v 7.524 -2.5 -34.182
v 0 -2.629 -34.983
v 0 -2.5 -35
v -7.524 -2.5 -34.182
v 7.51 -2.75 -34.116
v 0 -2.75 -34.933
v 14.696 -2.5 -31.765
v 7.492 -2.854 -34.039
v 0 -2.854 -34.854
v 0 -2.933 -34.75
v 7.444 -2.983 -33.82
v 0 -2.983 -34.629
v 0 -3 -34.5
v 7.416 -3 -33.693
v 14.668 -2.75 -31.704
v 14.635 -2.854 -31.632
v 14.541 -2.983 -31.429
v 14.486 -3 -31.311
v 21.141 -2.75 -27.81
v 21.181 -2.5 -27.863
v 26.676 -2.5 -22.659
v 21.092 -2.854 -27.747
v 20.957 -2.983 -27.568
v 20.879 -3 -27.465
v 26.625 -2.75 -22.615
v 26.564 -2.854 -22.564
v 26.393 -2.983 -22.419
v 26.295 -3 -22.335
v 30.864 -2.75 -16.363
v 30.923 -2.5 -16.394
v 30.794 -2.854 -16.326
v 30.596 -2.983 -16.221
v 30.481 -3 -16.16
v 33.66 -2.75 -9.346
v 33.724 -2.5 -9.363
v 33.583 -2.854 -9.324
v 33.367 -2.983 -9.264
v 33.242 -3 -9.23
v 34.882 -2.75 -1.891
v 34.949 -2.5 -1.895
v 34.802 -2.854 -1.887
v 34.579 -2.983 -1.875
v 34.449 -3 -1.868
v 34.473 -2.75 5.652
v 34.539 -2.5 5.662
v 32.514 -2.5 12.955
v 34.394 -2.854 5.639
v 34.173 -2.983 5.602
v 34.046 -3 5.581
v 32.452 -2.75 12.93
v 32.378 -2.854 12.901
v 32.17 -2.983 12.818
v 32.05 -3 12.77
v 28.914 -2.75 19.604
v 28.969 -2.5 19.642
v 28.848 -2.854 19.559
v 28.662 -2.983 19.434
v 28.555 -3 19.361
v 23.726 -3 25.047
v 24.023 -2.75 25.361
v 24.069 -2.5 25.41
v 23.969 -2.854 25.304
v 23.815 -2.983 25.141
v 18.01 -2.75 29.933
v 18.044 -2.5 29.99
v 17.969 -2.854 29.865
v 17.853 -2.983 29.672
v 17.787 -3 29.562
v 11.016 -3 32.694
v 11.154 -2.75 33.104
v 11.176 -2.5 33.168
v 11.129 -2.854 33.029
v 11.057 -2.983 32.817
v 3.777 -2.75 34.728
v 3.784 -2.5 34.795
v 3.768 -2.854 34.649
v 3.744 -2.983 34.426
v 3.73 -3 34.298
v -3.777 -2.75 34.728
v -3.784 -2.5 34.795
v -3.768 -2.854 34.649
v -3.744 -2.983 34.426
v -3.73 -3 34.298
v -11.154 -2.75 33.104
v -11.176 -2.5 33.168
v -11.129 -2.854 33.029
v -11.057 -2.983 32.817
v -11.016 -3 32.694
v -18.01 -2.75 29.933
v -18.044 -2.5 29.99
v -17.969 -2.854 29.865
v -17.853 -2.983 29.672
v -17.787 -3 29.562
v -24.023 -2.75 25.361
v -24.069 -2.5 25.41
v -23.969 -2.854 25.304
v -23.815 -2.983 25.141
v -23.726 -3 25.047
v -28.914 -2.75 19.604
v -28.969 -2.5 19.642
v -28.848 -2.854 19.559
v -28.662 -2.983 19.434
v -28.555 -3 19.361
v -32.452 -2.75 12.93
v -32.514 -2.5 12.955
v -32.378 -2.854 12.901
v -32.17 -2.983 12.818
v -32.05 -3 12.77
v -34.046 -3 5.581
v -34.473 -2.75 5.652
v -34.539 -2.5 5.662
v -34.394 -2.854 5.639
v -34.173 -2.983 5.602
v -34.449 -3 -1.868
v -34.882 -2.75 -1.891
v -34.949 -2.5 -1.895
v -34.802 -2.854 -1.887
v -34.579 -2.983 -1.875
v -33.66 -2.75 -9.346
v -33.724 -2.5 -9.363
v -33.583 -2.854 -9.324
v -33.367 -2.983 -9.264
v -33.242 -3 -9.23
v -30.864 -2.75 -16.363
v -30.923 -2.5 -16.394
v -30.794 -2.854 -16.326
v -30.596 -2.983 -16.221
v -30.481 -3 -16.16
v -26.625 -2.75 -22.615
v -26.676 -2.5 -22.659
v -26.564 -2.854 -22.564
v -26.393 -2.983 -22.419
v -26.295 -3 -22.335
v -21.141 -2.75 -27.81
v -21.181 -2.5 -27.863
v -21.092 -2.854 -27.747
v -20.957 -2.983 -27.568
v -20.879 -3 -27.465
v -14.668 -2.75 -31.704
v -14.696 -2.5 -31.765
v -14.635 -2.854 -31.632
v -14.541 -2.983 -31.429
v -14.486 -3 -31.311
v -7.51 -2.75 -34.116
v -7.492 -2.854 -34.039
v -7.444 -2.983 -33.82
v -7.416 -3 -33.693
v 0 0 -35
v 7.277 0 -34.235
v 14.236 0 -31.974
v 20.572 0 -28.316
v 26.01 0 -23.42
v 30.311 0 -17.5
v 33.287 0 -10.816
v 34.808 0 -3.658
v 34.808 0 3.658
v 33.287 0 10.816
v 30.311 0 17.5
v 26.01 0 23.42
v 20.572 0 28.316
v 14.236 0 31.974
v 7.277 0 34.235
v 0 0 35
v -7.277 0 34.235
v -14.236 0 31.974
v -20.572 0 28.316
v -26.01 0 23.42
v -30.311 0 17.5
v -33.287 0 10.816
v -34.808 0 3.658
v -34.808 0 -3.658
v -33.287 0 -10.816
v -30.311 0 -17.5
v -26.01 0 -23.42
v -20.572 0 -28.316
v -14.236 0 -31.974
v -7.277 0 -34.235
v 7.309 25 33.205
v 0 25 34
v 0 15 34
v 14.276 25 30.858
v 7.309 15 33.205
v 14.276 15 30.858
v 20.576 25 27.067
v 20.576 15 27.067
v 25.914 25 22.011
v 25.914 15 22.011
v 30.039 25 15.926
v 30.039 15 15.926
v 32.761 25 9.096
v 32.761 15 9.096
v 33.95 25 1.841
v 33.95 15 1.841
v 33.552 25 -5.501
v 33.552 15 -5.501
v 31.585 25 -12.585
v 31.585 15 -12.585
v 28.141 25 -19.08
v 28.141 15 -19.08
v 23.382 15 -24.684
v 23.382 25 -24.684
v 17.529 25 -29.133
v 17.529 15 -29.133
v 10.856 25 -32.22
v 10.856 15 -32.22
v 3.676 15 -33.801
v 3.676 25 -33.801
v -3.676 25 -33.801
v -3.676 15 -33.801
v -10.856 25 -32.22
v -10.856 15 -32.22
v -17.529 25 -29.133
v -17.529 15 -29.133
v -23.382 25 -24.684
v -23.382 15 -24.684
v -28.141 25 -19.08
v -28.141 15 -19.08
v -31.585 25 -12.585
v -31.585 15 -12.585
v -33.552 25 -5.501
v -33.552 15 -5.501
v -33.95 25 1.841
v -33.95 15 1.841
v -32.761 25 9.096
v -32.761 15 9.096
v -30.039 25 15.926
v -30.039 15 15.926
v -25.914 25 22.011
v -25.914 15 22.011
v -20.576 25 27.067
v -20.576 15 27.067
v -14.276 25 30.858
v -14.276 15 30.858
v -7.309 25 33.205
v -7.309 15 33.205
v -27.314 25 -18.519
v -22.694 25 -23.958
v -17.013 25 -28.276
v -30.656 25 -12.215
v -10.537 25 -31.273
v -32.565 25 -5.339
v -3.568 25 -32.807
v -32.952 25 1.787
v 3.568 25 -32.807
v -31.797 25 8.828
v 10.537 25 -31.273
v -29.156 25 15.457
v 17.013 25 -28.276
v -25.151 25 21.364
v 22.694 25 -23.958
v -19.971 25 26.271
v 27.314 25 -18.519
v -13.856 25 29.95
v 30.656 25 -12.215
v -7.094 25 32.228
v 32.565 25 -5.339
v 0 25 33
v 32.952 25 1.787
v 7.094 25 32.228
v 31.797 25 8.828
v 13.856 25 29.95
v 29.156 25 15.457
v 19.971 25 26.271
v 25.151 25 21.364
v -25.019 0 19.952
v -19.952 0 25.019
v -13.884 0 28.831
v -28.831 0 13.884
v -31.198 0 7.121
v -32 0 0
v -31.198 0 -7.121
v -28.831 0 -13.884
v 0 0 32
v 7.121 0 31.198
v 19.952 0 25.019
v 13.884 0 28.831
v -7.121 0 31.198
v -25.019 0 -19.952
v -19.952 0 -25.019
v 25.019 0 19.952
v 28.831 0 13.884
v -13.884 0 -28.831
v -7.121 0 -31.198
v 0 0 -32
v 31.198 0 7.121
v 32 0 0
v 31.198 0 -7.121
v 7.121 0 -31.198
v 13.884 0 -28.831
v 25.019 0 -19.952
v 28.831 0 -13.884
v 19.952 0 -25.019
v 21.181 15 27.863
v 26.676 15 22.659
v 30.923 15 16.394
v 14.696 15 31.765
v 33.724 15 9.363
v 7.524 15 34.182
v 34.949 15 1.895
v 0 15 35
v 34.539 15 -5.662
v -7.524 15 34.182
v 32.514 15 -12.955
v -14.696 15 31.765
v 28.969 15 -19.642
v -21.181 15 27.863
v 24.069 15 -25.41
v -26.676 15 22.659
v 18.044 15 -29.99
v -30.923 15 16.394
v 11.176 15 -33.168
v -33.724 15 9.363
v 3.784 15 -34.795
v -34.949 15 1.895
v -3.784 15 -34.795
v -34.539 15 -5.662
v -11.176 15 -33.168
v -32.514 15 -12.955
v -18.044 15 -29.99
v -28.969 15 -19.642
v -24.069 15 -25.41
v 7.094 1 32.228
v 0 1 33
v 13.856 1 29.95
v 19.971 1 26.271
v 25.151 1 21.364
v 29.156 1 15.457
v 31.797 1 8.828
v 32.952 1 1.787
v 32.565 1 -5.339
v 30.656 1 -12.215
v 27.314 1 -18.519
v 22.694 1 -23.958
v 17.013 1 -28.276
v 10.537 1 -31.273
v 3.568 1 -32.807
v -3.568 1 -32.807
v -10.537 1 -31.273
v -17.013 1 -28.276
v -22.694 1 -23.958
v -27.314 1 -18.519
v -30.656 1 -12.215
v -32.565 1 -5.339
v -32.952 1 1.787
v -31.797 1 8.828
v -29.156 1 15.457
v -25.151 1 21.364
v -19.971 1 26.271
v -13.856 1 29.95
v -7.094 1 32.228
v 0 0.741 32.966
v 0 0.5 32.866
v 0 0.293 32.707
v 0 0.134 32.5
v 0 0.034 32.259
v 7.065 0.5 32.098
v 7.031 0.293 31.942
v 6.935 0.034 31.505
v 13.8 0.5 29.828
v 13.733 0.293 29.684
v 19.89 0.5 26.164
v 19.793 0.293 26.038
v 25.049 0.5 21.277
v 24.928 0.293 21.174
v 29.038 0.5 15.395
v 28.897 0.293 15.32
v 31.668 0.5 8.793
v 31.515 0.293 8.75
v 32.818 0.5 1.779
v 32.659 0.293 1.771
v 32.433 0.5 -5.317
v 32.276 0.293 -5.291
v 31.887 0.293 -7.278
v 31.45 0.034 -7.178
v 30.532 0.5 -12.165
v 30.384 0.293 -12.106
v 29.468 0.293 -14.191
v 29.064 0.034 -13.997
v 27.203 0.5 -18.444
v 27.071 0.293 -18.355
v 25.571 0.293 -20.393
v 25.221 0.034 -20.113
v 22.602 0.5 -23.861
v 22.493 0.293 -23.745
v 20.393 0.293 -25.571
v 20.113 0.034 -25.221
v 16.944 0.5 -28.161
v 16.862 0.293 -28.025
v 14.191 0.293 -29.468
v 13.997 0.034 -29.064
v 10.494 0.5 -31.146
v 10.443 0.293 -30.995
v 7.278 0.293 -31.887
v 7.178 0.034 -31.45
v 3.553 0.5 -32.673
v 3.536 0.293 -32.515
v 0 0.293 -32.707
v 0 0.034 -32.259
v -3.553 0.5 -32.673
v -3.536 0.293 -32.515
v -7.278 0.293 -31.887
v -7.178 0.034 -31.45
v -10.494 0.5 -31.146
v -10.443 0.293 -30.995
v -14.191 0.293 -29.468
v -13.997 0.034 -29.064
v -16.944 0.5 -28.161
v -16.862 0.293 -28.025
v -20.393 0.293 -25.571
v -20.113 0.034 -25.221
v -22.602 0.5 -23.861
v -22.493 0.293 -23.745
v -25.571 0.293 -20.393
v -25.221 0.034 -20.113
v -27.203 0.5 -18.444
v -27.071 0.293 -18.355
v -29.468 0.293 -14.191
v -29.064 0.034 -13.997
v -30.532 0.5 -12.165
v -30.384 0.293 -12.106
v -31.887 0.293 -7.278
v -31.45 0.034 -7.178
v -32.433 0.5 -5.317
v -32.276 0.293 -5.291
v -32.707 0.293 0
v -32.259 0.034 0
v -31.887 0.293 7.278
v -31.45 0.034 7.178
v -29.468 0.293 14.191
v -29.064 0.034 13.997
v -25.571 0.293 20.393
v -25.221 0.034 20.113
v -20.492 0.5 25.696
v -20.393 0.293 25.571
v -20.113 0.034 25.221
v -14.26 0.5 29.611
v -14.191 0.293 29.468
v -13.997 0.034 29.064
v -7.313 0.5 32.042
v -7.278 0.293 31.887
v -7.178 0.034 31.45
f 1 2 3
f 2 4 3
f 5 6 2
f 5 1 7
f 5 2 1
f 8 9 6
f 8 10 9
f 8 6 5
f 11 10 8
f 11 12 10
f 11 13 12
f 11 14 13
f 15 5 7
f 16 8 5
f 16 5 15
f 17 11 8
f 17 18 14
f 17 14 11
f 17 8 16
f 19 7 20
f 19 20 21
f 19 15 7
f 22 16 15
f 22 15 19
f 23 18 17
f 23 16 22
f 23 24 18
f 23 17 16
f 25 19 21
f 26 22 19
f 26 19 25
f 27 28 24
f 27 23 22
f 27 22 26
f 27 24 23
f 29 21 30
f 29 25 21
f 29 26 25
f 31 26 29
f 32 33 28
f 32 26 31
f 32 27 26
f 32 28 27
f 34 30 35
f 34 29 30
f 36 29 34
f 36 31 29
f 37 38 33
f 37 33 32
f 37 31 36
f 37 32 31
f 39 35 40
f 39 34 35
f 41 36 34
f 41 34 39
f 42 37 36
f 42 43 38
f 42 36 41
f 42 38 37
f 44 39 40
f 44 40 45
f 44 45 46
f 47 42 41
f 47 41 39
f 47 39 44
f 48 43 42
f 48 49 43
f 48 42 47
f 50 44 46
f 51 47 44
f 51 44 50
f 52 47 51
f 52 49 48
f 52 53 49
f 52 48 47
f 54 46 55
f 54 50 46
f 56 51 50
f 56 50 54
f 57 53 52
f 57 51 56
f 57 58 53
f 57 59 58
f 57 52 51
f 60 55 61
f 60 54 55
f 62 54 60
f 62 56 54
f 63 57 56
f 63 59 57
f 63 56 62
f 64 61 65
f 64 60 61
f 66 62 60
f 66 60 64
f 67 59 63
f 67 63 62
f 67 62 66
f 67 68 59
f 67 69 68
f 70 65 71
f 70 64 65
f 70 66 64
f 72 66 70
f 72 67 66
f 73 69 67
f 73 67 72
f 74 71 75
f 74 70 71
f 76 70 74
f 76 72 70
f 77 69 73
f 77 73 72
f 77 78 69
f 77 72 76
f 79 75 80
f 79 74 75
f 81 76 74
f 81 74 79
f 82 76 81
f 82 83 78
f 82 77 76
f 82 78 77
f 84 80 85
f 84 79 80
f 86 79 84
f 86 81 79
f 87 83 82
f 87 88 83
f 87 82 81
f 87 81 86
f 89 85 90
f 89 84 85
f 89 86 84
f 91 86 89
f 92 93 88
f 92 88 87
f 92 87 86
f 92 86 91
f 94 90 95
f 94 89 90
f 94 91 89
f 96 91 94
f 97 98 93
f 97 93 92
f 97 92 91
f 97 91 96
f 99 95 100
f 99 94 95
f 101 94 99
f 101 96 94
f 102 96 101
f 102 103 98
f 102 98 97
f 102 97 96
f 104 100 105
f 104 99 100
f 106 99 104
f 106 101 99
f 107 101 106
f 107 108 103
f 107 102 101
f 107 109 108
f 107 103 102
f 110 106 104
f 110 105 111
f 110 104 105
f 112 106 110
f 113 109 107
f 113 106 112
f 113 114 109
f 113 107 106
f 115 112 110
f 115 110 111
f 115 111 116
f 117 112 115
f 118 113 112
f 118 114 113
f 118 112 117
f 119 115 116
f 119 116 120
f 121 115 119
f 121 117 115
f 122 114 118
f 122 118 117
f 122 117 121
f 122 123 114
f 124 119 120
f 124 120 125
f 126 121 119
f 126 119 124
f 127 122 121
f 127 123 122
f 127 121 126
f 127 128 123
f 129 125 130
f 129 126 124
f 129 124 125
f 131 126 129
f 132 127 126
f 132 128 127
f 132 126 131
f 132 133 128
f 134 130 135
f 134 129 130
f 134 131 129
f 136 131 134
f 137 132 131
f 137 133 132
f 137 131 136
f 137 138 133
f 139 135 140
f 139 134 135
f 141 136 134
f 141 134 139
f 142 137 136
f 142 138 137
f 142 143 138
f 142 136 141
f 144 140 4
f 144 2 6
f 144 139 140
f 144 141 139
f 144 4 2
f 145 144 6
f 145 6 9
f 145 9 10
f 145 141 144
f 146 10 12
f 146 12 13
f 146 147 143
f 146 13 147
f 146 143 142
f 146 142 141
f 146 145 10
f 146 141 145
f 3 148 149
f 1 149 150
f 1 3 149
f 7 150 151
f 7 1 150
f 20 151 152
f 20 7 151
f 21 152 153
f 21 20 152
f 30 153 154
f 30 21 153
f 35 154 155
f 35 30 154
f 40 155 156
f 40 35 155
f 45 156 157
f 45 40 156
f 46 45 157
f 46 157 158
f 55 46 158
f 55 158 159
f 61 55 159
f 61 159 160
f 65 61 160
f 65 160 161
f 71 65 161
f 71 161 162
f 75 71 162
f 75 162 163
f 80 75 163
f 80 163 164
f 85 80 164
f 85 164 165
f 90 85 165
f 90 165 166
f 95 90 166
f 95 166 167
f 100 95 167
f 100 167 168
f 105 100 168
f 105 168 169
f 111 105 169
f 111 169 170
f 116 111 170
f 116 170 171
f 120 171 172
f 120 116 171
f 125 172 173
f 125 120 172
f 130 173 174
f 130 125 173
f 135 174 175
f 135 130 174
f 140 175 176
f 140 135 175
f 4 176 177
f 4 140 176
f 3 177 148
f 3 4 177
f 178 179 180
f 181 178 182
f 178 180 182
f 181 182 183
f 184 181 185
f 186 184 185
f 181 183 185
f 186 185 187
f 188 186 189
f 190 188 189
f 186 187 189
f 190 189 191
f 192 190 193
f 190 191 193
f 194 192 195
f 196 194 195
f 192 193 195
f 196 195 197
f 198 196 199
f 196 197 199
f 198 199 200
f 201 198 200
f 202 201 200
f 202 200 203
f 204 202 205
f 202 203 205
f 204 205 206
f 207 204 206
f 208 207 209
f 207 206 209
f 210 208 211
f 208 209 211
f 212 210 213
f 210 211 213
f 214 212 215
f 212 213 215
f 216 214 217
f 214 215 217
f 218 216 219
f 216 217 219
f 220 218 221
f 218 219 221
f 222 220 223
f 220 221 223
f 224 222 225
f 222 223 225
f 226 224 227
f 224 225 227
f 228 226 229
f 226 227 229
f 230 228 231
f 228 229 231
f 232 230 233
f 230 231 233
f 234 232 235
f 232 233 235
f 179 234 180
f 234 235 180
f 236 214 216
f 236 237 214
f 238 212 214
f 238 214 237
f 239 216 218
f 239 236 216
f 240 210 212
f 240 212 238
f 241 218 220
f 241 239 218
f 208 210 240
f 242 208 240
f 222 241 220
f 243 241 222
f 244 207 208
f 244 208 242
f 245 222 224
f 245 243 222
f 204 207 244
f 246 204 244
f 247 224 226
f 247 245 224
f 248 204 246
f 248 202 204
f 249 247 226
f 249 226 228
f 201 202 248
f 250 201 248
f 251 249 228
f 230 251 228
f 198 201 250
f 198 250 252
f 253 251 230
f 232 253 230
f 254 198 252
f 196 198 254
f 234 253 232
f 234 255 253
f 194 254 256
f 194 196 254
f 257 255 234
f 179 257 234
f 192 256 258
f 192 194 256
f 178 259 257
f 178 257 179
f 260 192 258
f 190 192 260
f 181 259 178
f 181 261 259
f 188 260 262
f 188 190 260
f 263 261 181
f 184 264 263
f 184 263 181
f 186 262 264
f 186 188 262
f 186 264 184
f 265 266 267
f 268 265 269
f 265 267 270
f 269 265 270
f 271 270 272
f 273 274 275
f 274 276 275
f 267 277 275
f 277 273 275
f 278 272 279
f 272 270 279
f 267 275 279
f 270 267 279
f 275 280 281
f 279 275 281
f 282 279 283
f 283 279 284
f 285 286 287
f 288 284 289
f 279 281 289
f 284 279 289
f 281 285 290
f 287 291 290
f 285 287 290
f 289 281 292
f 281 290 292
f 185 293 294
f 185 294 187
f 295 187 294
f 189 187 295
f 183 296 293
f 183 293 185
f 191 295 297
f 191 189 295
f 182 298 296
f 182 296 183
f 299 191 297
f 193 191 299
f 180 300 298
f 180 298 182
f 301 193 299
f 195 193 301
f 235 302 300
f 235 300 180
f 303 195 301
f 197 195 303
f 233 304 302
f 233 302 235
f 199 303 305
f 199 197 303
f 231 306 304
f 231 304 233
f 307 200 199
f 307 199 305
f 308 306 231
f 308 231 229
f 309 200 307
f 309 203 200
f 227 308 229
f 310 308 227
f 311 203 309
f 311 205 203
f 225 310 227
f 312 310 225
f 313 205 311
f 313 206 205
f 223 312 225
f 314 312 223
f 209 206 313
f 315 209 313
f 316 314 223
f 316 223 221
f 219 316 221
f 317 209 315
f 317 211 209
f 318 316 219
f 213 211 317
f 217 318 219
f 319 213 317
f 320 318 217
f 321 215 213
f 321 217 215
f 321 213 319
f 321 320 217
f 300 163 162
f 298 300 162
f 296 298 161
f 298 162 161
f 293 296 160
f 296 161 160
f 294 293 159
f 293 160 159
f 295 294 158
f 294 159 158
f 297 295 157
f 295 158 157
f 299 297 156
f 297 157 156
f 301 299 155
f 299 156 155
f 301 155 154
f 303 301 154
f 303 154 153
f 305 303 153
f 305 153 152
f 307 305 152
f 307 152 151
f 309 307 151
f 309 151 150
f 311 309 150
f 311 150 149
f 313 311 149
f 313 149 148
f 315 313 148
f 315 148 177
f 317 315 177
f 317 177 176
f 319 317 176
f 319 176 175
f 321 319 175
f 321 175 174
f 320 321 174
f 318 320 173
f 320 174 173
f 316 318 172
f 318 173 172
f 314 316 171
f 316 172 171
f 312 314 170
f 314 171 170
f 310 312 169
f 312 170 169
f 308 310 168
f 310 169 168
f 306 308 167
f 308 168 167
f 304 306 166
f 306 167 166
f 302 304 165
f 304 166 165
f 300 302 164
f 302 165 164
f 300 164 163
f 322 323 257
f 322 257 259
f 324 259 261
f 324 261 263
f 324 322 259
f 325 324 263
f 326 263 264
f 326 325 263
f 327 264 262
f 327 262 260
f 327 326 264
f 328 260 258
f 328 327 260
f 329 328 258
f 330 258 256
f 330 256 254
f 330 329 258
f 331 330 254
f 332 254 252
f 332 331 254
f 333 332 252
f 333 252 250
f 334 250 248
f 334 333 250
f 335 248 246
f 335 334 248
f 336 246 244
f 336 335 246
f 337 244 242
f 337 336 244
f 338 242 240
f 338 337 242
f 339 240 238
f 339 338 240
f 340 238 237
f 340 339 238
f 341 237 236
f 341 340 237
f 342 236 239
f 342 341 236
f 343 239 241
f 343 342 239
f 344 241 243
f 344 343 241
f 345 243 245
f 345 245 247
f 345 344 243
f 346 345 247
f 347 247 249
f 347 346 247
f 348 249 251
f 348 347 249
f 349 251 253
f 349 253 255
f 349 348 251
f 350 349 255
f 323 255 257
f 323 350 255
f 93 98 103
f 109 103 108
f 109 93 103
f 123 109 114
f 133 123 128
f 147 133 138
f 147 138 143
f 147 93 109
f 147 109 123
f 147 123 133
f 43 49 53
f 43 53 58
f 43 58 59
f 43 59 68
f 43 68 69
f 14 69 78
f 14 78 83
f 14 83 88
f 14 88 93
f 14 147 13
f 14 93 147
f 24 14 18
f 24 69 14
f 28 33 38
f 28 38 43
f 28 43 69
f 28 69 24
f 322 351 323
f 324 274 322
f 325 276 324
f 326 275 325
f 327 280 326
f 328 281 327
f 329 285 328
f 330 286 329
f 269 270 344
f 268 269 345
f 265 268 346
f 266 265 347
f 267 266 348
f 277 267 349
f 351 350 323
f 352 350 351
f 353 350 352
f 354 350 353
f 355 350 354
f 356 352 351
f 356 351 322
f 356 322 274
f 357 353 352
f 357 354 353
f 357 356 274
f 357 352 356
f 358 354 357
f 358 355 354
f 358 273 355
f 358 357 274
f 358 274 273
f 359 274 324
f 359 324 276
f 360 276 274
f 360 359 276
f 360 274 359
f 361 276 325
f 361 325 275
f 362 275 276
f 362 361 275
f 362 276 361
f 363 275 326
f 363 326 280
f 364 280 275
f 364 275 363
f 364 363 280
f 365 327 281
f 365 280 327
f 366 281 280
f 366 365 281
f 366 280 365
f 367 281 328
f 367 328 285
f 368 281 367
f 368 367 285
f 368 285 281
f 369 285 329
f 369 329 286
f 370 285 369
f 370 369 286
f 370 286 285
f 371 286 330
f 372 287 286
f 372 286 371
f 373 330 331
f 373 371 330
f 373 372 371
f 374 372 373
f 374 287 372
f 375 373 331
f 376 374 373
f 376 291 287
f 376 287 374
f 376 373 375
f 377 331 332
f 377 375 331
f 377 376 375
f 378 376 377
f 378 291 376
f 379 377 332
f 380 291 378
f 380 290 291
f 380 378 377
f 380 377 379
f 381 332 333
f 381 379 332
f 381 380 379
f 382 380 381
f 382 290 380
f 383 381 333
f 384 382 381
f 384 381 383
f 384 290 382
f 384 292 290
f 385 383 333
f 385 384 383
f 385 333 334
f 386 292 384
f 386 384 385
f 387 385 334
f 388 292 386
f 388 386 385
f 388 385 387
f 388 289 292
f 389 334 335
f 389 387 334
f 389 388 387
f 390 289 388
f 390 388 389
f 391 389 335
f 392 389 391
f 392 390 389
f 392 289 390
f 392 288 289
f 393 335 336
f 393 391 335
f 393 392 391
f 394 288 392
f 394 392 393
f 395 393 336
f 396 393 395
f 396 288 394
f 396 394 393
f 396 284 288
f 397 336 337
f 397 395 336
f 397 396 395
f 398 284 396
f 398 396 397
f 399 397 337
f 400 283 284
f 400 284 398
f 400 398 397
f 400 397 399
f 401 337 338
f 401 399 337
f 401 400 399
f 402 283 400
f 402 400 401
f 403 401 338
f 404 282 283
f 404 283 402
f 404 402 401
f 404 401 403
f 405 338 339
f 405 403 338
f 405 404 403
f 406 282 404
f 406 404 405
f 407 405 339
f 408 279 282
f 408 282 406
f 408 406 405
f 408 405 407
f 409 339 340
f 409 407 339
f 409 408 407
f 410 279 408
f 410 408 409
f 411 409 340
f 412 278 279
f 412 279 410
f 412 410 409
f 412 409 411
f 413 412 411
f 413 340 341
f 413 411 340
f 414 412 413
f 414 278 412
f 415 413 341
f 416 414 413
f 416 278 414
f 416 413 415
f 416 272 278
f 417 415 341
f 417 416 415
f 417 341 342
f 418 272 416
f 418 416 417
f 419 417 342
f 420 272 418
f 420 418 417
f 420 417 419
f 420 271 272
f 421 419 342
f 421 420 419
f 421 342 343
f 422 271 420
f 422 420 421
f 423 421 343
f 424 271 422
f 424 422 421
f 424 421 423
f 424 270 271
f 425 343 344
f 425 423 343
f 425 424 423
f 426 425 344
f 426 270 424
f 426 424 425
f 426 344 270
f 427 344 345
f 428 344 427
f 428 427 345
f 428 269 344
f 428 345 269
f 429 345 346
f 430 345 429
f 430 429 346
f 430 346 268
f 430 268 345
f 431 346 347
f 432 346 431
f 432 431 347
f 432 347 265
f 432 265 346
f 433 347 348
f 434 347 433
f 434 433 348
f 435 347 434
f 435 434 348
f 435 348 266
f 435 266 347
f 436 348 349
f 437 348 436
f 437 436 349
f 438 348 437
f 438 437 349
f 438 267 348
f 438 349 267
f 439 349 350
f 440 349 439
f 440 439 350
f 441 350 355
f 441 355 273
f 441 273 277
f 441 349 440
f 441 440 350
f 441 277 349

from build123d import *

# Parameters (mm, degrees)
SKETCH1_R           = 35
SKETCH1_R_2         = 33
BOSS_EXTRUDE1_DEPTH = 25
EXTRUDE_START       = 3
SKETCH_1_R          = 35
EXTRUDE_1_DEPTH     = 3
CUT_EXTRUDE_START   = -10
SKETCH_3_R          = 35
SKETCH_3_R_2        = 34
CUT_EXTRUDE_1_DEPTH = 10
FILLET_1_R          = 1
FILLET_2_R          = 0.5


with BuildPart() as part:
    # Sketch1 → Boss-Extrude1 (new body)
    with BuildSketch(Plane(origin=(0, 0, 0), x_dir=(1, 0, 0), z_dir=(0, 1, 0))):
        with Locations(Location((0, 0, 0), (0, 0, 270))):
            Circle(SKETCH1_R)
        with Locations(Location((0, 0, 0), (0, 0, 270))):
            Circle(SKETCH1_R_2, mode=Mode.SUBTRACT)
    extrude(amount=BOSS_EXTRUDE1_DEPTH)

    # Эскиз1 → Бобышка-Вытянуть1 (add)
    with BuildSketch(Plane.XZ.offset(EXTRUDE_START)):
        with Locations(Location((0, 0, 0), (0, 0, 270))):
            Circle(SKETCH_1_R)
    extrude(amount=-EXTRUDE_1_DEPTH)

    # Эскиз3 → Вырез-Вытянуть1 (cut)
    with BuildSketch(Plane(origin=(0, 25, 0), x_dir=(1, 0, 0), z_dir=(0, 1, 0)).offset(CUT_EXTRUDE_START)):
        with Locations(Location((0, 0, 0), (0, 0, 90))):
            Circle(SKETCH_3_R)
        with Locations(Location((0, 0, 0), (0, 0, 270))):
            Circle(SKETCH_3_R_2, mode=Mode.SUBTRACT)
    extrude(amount=CUT_EXTRUDE_1_DEPTH, mode=Mode.SUBTRACT)

    # Скругление1
    fillet_1_edges = [part.edges().sort_by_distance(p)[0] for p in [
        (0, 0, -33),
    ]]
    fillet(fillet_1_edges, radius=FILLET_1_R)

    # Скругление2
    fillet_2_edges = [part.edges().sort_by_distance(p)[0] for p in [
        (0, -3, 35),
    ]]
    fillet(fillet_2_edges, radius=FILLET_2_R)


solid = part.part
